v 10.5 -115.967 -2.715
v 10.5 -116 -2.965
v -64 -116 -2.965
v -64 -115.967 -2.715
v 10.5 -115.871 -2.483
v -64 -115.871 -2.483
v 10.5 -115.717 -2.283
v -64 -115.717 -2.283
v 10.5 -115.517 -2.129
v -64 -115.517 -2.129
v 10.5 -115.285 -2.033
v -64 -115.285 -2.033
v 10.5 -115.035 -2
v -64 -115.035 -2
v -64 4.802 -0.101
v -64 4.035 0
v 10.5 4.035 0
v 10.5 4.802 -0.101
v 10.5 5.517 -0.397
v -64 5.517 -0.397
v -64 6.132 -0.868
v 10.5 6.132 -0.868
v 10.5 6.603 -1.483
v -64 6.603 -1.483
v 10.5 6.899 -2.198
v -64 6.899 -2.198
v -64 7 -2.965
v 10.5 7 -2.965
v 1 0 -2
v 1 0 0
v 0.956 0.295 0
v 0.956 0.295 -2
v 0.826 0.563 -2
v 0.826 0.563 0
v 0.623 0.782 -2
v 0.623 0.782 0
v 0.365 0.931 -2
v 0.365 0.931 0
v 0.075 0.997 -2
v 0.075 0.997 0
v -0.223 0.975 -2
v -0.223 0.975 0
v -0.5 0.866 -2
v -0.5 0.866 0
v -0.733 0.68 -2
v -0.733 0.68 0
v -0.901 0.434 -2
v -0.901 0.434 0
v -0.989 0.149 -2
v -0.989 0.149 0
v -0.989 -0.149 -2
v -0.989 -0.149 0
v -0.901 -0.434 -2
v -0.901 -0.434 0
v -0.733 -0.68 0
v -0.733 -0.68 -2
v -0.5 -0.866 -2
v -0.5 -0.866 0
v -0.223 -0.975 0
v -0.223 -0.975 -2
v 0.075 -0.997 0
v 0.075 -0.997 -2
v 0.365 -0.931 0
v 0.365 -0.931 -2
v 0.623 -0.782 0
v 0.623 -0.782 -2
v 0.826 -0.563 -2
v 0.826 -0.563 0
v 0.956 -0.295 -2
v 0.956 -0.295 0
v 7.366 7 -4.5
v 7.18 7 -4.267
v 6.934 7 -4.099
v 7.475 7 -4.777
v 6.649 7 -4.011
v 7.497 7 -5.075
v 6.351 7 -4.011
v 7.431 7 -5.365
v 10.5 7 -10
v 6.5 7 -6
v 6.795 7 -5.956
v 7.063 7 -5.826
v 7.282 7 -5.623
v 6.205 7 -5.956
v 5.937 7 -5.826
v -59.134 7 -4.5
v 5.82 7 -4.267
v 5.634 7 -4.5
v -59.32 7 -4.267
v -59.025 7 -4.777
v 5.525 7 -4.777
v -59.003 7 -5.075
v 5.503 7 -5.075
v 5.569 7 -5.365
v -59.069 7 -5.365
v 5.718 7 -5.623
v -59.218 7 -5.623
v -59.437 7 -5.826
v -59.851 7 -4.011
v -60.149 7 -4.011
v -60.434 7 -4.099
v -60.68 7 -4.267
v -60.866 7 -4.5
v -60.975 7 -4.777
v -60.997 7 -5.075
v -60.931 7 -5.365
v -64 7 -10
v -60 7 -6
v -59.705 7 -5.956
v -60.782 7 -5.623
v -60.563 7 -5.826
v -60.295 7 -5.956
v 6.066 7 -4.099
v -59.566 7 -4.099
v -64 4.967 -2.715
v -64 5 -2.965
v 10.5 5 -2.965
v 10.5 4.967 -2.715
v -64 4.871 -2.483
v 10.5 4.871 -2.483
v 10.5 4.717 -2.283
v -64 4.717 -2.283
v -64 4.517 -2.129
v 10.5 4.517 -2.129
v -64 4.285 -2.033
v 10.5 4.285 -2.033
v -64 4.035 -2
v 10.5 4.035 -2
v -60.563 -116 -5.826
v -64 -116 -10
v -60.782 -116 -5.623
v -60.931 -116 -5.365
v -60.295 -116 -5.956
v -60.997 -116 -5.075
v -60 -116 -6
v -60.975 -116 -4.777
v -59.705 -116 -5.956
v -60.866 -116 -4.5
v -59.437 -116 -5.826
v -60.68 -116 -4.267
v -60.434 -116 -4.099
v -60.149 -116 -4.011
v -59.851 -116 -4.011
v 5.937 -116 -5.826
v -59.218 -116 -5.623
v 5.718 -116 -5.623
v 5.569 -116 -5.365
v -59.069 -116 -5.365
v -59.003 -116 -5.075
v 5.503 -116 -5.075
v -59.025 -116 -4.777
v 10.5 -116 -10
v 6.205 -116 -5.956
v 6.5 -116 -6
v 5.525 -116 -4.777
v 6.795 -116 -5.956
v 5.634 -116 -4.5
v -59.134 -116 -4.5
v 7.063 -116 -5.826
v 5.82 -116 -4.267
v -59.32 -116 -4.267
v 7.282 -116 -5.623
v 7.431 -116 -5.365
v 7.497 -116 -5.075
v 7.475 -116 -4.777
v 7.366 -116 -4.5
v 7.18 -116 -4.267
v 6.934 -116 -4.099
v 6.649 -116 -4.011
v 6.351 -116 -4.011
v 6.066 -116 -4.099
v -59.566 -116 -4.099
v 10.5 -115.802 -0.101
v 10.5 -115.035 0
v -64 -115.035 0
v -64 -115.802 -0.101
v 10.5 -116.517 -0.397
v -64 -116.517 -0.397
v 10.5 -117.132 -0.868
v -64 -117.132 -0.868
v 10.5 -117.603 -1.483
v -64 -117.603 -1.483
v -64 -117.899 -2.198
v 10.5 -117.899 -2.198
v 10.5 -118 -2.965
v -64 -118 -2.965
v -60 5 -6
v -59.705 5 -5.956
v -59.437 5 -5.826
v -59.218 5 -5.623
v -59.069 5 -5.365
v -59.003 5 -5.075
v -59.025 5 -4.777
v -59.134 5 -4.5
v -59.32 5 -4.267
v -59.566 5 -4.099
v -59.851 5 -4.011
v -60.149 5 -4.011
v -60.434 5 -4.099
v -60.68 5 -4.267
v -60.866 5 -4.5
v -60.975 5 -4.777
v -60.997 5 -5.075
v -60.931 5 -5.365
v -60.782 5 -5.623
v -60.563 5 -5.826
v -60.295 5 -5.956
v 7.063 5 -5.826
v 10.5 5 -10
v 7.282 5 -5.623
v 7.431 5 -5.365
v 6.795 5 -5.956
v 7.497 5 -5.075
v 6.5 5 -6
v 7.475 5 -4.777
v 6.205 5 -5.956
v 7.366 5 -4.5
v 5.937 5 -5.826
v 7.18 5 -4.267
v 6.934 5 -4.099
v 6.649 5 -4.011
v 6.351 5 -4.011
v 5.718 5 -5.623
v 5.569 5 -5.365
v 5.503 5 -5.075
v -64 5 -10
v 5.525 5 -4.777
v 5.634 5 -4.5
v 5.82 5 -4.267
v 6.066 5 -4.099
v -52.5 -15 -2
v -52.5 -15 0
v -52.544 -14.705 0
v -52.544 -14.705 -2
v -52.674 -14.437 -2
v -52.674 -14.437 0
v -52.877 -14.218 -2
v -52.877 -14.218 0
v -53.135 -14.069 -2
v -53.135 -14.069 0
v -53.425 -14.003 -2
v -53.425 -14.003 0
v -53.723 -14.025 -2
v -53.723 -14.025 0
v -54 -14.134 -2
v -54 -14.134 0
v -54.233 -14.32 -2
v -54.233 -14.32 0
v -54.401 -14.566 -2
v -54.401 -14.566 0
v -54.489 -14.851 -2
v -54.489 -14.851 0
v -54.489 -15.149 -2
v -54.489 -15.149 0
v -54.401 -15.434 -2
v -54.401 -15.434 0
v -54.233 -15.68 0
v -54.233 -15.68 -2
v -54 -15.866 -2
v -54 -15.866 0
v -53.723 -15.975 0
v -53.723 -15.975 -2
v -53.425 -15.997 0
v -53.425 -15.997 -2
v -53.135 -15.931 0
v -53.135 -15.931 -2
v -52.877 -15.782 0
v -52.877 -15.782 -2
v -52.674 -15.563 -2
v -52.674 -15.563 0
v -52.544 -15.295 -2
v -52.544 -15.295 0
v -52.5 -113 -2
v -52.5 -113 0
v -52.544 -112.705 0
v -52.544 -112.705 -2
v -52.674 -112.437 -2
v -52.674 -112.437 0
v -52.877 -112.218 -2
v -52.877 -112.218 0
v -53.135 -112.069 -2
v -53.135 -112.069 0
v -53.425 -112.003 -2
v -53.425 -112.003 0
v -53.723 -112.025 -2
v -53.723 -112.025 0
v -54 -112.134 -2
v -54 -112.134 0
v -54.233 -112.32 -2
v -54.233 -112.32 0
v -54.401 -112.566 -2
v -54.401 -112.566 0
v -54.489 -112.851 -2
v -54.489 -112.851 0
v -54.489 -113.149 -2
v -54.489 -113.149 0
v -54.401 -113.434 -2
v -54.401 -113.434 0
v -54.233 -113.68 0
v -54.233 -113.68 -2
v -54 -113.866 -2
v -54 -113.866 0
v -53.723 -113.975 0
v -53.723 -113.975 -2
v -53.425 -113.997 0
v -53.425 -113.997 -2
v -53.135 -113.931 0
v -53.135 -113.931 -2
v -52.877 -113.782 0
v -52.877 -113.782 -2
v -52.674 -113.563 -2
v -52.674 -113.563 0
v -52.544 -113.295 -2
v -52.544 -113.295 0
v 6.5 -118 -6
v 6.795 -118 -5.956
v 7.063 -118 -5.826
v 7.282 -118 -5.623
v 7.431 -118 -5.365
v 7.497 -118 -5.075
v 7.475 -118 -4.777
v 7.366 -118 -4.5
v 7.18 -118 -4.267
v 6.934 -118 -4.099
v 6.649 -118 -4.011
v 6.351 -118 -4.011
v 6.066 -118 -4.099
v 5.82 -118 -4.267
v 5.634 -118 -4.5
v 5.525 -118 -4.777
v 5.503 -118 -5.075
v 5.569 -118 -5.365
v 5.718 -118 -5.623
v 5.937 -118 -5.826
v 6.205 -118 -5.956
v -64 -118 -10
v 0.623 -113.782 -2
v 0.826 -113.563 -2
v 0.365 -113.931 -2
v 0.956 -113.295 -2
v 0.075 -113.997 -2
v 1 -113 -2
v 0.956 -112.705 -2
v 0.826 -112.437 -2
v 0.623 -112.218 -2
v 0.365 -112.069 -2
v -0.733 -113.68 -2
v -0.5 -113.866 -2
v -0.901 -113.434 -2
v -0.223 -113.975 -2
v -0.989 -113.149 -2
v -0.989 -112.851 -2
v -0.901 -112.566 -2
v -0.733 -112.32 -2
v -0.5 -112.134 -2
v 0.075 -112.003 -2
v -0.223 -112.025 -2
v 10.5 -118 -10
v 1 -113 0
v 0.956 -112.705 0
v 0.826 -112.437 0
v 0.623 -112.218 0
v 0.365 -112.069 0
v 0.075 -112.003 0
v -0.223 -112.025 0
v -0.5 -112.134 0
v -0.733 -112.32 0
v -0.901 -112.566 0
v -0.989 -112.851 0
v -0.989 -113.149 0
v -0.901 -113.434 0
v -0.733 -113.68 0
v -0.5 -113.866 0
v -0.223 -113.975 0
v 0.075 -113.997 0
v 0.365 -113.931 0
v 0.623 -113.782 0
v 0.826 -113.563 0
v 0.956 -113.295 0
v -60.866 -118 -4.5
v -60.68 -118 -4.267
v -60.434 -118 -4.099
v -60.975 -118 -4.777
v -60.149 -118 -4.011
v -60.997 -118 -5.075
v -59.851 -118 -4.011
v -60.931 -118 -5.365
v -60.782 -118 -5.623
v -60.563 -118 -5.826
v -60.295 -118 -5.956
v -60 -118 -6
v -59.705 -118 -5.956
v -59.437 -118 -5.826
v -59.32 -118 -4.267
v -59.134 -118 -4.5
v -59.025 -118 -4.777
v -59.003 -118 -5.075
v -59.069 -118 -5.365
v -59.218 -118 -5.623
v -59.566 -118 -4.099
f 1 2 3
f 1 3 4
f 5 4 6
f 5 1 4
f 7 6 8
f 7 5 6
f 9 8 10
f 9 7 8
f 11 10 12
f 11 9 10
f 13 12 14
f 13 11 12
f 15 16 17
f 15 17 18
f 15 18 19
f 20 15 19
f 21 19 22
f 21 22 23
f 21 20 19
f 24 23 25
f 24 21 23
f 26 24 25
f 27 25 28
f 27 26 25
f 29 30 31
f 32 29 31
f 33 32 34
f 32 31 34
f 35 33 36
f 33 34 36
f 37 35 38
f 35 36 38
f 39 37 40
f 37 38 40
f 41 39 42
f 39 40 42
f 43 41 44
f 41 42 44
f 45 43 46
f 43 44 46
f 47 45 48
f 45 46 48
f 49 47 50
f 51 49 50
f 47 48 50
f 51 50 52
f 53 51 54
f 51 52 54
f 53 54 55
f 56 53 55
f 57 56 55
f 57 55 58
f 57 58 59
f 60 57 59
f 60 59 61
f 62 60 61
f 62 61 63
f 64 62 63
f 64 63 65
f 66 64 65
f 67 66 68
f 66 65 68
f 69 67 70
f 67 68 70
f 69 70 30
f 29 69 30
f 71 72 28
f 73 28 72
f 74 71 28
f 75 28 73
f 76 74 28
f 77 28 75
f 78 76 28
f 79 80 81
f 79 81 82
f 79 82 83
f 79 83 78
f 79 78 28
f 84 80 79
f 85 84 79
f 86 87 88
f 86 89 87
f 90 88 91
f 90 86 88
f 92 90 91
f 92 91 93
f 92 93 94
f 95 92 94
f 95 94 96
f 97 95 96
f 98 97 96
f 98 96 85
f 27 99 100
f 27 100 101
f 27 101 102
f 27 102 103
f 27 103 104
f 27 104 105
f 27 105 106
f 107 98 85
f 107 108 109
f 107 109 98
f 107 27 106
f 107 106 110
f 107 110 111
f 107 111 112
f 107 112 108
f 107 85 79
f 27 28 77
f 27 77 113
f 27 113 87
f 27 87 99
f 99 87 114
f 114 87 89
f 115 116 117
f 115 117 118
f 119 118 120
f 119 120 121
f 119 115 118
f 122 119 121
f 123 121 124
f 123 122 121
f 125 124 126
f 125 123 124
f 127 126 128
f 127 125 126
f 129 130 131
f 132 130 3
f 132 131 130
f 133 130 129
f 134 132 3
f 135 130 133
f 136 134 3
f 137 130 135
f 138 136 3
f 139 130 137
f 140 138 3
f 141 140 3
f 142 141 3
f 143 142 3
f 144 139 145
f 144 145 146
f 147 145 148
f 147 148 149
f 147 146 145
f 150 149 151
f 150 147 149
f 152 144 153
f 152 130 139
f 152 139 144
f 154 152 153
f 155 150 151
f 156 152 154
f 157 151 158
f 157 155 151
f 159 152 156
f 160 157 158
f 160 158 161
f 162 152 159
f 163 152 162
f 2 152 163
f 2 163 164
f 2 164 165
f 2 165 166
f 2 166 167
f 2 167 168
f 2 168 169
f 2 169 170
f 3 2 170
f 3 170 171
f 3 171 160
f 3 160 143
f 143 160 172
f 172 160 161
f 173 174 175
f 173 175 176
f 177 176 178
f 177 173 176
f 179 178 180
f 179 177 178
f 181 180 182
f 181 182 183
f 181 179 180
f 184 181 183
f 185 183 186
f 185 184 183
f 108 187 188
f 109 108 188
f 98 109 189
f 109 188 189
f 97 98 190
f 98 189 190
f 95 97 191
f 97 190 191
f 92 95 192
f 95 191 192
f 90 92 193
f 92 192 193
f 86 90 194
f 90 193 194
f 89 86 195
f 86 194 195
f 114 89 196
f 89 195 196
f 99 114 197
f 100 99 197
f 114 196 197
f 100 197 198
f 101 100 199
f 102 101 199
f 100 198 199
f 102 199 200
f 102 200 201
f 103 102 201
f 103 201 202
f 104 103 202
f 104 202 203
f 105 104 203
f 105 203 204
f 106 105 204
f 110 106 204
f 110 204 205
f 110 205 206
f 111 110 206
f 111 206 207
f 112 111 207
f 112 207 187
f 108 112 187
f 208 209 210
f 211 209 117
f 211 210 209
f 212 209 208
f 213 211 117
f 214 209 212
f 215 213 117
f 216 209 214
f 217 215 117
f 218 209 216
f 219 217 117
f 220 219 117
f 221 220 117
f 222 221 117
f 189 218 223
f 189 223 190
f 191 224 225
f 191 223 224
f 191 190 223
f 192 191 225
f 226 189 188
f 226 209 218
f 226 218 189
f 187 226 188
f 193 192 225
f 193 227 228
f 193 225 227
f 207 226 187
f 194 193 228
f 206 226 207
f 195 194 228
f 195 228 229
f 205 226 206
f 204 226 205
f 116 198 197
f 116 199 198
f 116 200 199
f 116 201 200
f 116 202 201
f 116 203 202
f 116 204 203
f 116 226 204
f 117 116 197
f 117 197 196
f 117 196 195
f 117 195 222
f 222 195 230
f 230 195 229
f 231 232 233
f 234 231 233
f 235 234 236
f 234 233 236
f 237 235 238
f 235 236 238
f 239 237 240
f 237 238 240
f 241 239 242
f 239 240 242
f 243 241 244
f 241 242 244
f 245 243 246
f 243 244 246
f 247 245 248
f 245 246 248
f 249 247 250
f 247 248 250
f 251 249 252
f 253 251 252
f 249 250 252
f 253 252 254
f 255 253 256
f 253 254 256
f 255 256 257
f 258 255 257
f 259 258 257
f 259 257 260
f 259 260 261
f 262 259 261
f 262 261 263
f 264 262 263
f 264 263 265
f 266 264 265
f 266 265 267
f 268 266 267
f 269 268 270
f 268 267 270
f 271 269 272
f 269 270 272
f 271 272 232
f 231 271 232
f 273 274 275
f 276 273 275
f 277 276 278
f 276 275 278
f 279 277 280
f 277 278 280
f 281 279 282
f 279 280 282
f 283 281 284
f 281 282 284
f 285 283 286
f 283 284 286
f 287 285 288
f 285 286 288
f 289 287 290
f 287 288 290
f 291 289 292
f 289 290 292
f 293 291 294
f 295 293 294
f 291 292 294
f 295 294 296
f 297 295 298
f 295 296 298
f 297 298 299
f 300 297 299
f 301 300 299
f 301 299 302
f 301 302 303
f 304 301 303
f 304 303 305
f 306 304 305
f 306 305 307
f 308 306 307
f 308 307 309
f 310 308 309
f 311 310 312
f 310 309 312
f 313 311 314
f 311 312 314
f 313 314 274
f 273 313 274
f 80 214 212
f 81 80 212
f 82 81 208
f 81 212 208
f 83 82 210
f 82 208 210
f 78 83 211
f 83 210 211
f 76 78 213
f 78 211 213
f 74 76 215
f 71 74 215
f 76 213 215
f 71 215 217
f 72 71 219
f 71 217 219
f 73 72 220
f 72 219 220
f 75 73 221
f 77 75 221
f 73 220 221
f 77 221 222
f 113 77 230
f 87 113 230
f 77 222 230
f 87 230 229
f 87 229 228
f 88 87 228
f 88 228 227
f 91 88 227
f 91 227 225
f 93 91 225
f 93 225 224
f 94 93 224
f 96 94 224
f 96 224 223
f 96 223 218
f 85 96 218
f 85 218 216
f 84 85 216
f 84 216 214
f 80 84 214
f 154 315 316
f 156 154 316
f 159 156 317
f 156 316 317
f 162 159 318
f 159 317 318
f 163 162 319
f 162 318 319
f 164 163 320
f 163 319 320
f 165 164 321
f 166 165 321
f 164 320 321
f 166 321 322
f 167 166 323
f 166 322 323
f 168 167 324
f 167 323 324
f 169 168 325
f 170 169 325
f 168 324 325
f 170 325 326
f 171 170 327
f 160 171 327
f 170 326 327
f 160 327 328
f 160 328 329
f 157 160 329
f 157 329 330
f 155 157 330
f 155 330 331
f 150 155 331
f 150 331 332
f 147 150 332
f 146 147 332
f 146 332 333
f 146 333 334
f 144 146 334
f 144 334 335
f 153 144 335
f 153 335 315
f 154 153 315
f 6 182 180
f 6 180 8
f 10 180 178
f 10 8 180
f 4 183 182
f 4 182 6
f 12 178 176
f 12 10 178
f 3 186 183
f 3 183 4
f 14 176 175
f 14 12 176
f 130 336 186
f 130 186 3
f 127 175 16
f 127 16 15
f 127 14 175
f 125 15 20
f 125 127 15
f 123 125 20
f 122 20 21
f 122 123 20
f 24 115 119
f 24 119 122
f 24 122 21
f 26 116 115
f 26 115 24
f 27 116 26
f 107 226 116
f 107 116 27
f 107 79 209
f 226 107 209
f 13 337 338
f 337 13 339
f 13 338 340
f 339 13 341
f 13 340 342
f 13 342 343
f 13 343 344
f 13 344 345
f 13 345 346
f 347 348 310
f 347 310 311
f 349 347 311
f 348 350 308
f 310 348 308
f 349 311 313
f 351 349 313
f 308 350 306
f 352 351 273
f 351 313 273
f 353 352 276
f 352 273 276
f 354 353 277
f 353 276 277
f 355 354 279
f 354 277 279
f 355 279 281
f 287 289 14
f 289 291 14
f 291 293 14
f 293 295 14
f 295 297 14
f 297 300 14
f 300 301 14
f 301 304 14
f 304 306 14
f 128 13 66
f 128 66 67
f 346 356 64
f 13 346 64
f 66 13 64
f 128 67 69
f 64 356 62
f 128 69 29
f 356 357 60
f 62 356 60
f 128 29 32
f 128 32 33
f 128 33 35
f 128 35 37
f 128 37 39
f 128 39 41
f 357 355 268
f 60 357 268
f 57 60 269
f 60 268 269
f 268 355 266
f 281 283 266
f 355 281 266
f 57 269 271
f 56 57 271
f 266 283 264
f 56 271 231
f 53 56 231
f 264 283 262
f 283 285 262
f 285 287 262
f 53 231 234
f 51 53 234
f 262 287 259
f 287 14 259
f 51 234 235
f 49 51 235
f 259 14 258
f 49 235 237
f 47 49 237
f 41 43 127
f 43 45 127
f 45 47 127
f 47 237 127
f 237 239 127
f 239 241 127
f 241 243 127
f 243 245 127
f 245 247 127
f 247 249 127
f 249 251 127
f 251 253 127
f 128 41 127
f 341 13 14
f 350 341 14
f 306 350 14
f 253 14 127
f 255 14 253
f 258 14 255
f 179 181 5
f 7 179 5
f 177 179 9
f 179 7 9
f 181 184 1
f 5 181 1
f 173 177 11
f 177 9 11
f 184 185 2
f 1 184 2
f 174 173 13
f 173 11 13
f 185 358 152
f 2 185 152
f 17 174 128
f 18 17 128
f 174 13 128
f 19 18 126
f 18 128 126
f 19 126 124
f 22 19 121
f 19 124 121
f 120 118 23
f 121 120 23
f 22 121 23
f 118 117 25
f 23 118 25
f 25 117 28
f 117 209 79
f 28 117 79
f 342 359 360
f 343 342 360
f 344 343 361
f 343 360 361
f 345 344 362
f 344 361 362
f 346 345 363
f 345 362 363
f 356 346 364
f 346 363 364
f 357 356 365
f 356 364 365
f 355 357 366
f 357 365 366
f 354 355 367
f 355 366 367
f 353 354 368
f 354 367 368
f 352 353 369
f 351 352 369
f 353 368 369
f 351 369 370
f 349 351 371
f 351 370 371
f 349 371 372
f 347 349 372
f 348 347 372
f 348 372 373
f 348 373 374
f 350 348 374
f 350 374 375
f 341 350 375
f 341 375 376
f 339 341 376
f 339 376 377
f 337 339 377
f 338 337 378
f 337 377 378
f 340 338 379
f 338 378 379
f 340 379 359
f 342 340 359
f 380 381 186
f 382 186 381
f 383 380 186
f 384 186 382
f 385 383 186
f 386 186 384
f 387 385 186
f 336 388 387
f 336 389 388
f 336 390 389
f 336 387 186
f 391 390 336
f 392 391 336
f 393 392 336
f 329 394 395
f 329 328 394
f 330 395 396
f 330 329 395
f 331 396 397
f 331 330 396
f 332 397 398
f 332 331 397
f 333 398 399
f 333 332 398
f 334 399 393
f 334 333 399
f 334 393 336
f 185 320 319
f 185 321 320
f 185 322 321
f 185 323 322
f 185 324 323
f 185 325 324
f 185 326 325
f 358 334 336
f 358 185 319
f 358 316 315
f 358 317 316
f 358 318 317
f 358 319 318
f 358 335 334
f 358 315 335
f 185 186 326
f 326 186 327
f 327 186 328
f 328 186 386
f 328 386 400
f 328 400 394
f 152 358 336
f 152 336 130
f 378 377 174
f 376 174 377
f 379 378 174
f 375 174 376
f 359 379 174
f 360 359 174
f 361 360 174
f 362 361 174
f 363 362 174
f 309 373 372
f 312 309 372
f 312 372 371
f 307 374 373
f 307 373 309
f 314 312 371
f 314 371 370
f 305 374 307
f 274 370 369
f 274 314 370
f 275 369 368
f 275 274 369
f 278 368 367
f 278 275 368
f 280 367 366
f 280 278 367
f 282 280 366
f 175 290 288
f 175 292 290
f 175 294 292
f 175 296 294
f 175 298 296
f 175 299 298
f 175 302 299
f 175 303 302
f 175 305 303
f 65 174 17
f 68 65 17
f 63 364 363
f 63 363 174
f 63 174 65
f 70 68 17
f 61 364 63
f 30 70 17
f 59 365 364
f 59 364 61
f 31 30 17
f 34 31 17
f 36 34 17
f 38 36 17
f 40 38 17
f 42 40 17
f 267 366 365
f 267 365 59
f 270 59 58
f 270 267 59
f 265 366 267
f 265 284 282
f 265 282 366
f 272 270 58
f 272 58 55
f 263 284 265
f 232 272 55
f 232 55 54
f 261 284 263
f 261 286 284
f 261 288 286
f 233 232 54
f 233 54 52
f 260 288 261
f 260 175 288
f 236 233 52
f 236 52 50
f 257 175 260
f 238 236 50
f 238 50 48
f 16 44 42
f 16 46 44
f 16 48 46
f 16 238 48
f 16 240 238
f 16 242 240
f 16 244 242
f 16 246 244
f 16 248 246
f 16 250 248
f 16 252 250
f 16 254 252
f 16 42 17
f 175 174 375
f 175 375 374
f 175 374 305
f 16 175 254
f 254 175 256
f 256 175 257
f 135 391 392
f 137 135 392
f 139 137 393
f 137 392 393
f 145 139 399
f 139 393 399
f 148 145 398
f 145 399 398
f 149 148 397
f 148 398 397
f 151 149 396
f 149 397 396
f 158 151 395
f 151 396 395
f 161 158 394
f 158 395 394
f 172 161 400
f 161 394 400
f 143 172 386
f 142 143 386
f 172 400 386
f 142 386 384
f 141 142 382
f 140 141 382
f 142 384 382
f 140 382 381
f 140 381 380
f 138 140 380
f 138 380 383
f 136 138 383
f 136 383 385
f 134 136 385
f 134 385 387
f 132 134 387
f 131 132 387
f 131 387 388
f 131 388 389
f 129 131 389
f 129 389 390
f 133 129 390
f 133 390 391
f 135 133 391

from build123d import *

# Parameters (mm, degrees)
SKETCH1_W                      = 125
SKETCH1_H                      = 74.5
SKETCH1_R                      = 1
BASE_FLANGE1_DEPTH             = 2
EDGE_FLANGE2_STRIP_W           = 9.9304
EDGE_FLANGE2_STRIP_H           = 2
EDGE_FLANGE2_STRIP_CUT_DEPTH   = 74.5
EDGE_FLANGE2_STRIP_2_W         = 9.9304
EDGE_FLANGE2_STRIP_2_H         = 2
EDGE_FLANGE2_STRIP_CUT_2_DEPTH = 74.5
EDGE_FLANGE2_DEPTH             = 74.5
EDGE_FLANGE2_BEND_DEPTH        = 74.5
SKETCH20_R                     = 1
CUT_EXTRUDE2_DEPTH             = 141.78707327


# Sheet-metal steps are written as plain solids
with BuildPart() as part:
    # Sketch1 → Base-Flange1 (new body)
    with BuildSketch(Plane(origin=(0, 0, 0), x_dir=(0, 1, 0), z_dir=(0, 0, 1))):
        with Locations((-55.5, 26.75)):
            Rectangle(SKETCH1_W, SKETCH1_H)
        with Locations(Location((0, 0, 0), (0, 0, 270))):
            Circle(SKETCH1_R, mode=Mode.SUBTRACT)
        with Locations(Location((-113, 0, 0), (0, 0, 270))):
            Circle(SKETCH1_R, mode=Mode.SUBTRACT)
        with Locations(Location((-113, 53.5, 0), (0, 0, 270))):
            Circle(SKETCH1_R, mode=Mode.SUBTRACT)
        with Locations(Location((-15, 53.5, 0), (0, 0, 270))):
            Circle(SKETCH1_R, mode=Mode.SUBTRACT)
    extrude(amount=-BASE_FLANGE1_DEPTH)

    # Edge-Flange2 strip (across the edge) → Edge-Flange2 strip cut (cut)
    with BuildSketch(Plane(origin=(10.5, -118, -2), x_dir=(0, 1, 0), z_dir=(-1, 0, 0))):
        with Locations((-2, -1)):
            Rectangle(EDGE_FLANGE2_STRIP_W, EDGE_FLANGE2_STRIP_H)
    extrude(amount=EDGE_FLANGE2_STRIP_CUT_DEPTH, mode=Mode.SUBTRACT)

    # Edge-Flange2 strip 2 (across the edge) → Edge-Flange2 strip cut 2 (cut)
    with BuildSketch(Plane(origin=(-64, 7, -2), x_dir=(0, -1, 0), z_dir=(1, 0, 0))):
        with Locations((-2, -1)):
            Rectangle(EDGE_FLANGE2_STRIP_2_W, EDGE_FLANGE2_STRIP_2_H)
    extrude(amount=EDGE_FLANGE2_STRIP_CUT_2_DEPTH, mode=Mode.SUBTRACT)

    # Edge-Flange2 section (across the edge) → Edge-Flange2 (add)
    with BuildSketch(Plane(origin=(10.5, -118, -2), x_dir=(0, 1, 0), z_dir=(-1, 0, 0))):
        with BuildLine():
            Line((0, 0.9652), (0, 8))
            Line((0, 8), (2, 8))
            Line((2, 8), (2, 0.9652))
            ThreePointArc((2, 0.9652), (2.282700535, 0.282700535), (2.9652, 0))
            Line((2.9652, 0), (2.9652, -2))
            ThreePointArc((2.9652, -2), (0.868486972, -1.131513028), (0, 0.9652))
        make_face()
    extrude(amount=EDGE_FLANGE2_DEPTH)

    # Edge-Flange2 section 2 (across the edge) → Edge-Flange2 bend (add)
    with BuildSketch(Plane(origin=(-64, 7, -2), x_dir=(0, -1, 0), z_dir=(1, 0, 0))):
        with BuildLine():
            Line((0, 0.9652), (0, 8))
            Line((0, 8), (2, 8))
            Line((2, 8), (2, 0.9652))
            ThreePointArc((2, 0.9652), (2.282700535, 0.282700535), (2.9652, 0))
            Line((2.9652, 0), (2.9652, -2))
            ThreePointArc((2.9652, -2), (0.868486972, -1.131513028), (0, 0.9652))
        make_face()
    extrude(amount=EDGE_FLANGE2_BEND_DEPTH)

    # Sketch20 → Cut-Extrude2 (cut, through all)
    with BuildSketch(Plane.XZ.offset(118)):
        with Locations(Location((-60, -5, 0), (0, 0, 270))):
            Circle(SKETCH20_R)
        with Locations(Location((6.5, -5, 0), (0, 0, 270))):
            Circle(SKETCH20_R)
    extrude(amount=-CUT_EXTRUDE2_DEPTH, mode=Mode.SUBTRACT)


solid = part.part
